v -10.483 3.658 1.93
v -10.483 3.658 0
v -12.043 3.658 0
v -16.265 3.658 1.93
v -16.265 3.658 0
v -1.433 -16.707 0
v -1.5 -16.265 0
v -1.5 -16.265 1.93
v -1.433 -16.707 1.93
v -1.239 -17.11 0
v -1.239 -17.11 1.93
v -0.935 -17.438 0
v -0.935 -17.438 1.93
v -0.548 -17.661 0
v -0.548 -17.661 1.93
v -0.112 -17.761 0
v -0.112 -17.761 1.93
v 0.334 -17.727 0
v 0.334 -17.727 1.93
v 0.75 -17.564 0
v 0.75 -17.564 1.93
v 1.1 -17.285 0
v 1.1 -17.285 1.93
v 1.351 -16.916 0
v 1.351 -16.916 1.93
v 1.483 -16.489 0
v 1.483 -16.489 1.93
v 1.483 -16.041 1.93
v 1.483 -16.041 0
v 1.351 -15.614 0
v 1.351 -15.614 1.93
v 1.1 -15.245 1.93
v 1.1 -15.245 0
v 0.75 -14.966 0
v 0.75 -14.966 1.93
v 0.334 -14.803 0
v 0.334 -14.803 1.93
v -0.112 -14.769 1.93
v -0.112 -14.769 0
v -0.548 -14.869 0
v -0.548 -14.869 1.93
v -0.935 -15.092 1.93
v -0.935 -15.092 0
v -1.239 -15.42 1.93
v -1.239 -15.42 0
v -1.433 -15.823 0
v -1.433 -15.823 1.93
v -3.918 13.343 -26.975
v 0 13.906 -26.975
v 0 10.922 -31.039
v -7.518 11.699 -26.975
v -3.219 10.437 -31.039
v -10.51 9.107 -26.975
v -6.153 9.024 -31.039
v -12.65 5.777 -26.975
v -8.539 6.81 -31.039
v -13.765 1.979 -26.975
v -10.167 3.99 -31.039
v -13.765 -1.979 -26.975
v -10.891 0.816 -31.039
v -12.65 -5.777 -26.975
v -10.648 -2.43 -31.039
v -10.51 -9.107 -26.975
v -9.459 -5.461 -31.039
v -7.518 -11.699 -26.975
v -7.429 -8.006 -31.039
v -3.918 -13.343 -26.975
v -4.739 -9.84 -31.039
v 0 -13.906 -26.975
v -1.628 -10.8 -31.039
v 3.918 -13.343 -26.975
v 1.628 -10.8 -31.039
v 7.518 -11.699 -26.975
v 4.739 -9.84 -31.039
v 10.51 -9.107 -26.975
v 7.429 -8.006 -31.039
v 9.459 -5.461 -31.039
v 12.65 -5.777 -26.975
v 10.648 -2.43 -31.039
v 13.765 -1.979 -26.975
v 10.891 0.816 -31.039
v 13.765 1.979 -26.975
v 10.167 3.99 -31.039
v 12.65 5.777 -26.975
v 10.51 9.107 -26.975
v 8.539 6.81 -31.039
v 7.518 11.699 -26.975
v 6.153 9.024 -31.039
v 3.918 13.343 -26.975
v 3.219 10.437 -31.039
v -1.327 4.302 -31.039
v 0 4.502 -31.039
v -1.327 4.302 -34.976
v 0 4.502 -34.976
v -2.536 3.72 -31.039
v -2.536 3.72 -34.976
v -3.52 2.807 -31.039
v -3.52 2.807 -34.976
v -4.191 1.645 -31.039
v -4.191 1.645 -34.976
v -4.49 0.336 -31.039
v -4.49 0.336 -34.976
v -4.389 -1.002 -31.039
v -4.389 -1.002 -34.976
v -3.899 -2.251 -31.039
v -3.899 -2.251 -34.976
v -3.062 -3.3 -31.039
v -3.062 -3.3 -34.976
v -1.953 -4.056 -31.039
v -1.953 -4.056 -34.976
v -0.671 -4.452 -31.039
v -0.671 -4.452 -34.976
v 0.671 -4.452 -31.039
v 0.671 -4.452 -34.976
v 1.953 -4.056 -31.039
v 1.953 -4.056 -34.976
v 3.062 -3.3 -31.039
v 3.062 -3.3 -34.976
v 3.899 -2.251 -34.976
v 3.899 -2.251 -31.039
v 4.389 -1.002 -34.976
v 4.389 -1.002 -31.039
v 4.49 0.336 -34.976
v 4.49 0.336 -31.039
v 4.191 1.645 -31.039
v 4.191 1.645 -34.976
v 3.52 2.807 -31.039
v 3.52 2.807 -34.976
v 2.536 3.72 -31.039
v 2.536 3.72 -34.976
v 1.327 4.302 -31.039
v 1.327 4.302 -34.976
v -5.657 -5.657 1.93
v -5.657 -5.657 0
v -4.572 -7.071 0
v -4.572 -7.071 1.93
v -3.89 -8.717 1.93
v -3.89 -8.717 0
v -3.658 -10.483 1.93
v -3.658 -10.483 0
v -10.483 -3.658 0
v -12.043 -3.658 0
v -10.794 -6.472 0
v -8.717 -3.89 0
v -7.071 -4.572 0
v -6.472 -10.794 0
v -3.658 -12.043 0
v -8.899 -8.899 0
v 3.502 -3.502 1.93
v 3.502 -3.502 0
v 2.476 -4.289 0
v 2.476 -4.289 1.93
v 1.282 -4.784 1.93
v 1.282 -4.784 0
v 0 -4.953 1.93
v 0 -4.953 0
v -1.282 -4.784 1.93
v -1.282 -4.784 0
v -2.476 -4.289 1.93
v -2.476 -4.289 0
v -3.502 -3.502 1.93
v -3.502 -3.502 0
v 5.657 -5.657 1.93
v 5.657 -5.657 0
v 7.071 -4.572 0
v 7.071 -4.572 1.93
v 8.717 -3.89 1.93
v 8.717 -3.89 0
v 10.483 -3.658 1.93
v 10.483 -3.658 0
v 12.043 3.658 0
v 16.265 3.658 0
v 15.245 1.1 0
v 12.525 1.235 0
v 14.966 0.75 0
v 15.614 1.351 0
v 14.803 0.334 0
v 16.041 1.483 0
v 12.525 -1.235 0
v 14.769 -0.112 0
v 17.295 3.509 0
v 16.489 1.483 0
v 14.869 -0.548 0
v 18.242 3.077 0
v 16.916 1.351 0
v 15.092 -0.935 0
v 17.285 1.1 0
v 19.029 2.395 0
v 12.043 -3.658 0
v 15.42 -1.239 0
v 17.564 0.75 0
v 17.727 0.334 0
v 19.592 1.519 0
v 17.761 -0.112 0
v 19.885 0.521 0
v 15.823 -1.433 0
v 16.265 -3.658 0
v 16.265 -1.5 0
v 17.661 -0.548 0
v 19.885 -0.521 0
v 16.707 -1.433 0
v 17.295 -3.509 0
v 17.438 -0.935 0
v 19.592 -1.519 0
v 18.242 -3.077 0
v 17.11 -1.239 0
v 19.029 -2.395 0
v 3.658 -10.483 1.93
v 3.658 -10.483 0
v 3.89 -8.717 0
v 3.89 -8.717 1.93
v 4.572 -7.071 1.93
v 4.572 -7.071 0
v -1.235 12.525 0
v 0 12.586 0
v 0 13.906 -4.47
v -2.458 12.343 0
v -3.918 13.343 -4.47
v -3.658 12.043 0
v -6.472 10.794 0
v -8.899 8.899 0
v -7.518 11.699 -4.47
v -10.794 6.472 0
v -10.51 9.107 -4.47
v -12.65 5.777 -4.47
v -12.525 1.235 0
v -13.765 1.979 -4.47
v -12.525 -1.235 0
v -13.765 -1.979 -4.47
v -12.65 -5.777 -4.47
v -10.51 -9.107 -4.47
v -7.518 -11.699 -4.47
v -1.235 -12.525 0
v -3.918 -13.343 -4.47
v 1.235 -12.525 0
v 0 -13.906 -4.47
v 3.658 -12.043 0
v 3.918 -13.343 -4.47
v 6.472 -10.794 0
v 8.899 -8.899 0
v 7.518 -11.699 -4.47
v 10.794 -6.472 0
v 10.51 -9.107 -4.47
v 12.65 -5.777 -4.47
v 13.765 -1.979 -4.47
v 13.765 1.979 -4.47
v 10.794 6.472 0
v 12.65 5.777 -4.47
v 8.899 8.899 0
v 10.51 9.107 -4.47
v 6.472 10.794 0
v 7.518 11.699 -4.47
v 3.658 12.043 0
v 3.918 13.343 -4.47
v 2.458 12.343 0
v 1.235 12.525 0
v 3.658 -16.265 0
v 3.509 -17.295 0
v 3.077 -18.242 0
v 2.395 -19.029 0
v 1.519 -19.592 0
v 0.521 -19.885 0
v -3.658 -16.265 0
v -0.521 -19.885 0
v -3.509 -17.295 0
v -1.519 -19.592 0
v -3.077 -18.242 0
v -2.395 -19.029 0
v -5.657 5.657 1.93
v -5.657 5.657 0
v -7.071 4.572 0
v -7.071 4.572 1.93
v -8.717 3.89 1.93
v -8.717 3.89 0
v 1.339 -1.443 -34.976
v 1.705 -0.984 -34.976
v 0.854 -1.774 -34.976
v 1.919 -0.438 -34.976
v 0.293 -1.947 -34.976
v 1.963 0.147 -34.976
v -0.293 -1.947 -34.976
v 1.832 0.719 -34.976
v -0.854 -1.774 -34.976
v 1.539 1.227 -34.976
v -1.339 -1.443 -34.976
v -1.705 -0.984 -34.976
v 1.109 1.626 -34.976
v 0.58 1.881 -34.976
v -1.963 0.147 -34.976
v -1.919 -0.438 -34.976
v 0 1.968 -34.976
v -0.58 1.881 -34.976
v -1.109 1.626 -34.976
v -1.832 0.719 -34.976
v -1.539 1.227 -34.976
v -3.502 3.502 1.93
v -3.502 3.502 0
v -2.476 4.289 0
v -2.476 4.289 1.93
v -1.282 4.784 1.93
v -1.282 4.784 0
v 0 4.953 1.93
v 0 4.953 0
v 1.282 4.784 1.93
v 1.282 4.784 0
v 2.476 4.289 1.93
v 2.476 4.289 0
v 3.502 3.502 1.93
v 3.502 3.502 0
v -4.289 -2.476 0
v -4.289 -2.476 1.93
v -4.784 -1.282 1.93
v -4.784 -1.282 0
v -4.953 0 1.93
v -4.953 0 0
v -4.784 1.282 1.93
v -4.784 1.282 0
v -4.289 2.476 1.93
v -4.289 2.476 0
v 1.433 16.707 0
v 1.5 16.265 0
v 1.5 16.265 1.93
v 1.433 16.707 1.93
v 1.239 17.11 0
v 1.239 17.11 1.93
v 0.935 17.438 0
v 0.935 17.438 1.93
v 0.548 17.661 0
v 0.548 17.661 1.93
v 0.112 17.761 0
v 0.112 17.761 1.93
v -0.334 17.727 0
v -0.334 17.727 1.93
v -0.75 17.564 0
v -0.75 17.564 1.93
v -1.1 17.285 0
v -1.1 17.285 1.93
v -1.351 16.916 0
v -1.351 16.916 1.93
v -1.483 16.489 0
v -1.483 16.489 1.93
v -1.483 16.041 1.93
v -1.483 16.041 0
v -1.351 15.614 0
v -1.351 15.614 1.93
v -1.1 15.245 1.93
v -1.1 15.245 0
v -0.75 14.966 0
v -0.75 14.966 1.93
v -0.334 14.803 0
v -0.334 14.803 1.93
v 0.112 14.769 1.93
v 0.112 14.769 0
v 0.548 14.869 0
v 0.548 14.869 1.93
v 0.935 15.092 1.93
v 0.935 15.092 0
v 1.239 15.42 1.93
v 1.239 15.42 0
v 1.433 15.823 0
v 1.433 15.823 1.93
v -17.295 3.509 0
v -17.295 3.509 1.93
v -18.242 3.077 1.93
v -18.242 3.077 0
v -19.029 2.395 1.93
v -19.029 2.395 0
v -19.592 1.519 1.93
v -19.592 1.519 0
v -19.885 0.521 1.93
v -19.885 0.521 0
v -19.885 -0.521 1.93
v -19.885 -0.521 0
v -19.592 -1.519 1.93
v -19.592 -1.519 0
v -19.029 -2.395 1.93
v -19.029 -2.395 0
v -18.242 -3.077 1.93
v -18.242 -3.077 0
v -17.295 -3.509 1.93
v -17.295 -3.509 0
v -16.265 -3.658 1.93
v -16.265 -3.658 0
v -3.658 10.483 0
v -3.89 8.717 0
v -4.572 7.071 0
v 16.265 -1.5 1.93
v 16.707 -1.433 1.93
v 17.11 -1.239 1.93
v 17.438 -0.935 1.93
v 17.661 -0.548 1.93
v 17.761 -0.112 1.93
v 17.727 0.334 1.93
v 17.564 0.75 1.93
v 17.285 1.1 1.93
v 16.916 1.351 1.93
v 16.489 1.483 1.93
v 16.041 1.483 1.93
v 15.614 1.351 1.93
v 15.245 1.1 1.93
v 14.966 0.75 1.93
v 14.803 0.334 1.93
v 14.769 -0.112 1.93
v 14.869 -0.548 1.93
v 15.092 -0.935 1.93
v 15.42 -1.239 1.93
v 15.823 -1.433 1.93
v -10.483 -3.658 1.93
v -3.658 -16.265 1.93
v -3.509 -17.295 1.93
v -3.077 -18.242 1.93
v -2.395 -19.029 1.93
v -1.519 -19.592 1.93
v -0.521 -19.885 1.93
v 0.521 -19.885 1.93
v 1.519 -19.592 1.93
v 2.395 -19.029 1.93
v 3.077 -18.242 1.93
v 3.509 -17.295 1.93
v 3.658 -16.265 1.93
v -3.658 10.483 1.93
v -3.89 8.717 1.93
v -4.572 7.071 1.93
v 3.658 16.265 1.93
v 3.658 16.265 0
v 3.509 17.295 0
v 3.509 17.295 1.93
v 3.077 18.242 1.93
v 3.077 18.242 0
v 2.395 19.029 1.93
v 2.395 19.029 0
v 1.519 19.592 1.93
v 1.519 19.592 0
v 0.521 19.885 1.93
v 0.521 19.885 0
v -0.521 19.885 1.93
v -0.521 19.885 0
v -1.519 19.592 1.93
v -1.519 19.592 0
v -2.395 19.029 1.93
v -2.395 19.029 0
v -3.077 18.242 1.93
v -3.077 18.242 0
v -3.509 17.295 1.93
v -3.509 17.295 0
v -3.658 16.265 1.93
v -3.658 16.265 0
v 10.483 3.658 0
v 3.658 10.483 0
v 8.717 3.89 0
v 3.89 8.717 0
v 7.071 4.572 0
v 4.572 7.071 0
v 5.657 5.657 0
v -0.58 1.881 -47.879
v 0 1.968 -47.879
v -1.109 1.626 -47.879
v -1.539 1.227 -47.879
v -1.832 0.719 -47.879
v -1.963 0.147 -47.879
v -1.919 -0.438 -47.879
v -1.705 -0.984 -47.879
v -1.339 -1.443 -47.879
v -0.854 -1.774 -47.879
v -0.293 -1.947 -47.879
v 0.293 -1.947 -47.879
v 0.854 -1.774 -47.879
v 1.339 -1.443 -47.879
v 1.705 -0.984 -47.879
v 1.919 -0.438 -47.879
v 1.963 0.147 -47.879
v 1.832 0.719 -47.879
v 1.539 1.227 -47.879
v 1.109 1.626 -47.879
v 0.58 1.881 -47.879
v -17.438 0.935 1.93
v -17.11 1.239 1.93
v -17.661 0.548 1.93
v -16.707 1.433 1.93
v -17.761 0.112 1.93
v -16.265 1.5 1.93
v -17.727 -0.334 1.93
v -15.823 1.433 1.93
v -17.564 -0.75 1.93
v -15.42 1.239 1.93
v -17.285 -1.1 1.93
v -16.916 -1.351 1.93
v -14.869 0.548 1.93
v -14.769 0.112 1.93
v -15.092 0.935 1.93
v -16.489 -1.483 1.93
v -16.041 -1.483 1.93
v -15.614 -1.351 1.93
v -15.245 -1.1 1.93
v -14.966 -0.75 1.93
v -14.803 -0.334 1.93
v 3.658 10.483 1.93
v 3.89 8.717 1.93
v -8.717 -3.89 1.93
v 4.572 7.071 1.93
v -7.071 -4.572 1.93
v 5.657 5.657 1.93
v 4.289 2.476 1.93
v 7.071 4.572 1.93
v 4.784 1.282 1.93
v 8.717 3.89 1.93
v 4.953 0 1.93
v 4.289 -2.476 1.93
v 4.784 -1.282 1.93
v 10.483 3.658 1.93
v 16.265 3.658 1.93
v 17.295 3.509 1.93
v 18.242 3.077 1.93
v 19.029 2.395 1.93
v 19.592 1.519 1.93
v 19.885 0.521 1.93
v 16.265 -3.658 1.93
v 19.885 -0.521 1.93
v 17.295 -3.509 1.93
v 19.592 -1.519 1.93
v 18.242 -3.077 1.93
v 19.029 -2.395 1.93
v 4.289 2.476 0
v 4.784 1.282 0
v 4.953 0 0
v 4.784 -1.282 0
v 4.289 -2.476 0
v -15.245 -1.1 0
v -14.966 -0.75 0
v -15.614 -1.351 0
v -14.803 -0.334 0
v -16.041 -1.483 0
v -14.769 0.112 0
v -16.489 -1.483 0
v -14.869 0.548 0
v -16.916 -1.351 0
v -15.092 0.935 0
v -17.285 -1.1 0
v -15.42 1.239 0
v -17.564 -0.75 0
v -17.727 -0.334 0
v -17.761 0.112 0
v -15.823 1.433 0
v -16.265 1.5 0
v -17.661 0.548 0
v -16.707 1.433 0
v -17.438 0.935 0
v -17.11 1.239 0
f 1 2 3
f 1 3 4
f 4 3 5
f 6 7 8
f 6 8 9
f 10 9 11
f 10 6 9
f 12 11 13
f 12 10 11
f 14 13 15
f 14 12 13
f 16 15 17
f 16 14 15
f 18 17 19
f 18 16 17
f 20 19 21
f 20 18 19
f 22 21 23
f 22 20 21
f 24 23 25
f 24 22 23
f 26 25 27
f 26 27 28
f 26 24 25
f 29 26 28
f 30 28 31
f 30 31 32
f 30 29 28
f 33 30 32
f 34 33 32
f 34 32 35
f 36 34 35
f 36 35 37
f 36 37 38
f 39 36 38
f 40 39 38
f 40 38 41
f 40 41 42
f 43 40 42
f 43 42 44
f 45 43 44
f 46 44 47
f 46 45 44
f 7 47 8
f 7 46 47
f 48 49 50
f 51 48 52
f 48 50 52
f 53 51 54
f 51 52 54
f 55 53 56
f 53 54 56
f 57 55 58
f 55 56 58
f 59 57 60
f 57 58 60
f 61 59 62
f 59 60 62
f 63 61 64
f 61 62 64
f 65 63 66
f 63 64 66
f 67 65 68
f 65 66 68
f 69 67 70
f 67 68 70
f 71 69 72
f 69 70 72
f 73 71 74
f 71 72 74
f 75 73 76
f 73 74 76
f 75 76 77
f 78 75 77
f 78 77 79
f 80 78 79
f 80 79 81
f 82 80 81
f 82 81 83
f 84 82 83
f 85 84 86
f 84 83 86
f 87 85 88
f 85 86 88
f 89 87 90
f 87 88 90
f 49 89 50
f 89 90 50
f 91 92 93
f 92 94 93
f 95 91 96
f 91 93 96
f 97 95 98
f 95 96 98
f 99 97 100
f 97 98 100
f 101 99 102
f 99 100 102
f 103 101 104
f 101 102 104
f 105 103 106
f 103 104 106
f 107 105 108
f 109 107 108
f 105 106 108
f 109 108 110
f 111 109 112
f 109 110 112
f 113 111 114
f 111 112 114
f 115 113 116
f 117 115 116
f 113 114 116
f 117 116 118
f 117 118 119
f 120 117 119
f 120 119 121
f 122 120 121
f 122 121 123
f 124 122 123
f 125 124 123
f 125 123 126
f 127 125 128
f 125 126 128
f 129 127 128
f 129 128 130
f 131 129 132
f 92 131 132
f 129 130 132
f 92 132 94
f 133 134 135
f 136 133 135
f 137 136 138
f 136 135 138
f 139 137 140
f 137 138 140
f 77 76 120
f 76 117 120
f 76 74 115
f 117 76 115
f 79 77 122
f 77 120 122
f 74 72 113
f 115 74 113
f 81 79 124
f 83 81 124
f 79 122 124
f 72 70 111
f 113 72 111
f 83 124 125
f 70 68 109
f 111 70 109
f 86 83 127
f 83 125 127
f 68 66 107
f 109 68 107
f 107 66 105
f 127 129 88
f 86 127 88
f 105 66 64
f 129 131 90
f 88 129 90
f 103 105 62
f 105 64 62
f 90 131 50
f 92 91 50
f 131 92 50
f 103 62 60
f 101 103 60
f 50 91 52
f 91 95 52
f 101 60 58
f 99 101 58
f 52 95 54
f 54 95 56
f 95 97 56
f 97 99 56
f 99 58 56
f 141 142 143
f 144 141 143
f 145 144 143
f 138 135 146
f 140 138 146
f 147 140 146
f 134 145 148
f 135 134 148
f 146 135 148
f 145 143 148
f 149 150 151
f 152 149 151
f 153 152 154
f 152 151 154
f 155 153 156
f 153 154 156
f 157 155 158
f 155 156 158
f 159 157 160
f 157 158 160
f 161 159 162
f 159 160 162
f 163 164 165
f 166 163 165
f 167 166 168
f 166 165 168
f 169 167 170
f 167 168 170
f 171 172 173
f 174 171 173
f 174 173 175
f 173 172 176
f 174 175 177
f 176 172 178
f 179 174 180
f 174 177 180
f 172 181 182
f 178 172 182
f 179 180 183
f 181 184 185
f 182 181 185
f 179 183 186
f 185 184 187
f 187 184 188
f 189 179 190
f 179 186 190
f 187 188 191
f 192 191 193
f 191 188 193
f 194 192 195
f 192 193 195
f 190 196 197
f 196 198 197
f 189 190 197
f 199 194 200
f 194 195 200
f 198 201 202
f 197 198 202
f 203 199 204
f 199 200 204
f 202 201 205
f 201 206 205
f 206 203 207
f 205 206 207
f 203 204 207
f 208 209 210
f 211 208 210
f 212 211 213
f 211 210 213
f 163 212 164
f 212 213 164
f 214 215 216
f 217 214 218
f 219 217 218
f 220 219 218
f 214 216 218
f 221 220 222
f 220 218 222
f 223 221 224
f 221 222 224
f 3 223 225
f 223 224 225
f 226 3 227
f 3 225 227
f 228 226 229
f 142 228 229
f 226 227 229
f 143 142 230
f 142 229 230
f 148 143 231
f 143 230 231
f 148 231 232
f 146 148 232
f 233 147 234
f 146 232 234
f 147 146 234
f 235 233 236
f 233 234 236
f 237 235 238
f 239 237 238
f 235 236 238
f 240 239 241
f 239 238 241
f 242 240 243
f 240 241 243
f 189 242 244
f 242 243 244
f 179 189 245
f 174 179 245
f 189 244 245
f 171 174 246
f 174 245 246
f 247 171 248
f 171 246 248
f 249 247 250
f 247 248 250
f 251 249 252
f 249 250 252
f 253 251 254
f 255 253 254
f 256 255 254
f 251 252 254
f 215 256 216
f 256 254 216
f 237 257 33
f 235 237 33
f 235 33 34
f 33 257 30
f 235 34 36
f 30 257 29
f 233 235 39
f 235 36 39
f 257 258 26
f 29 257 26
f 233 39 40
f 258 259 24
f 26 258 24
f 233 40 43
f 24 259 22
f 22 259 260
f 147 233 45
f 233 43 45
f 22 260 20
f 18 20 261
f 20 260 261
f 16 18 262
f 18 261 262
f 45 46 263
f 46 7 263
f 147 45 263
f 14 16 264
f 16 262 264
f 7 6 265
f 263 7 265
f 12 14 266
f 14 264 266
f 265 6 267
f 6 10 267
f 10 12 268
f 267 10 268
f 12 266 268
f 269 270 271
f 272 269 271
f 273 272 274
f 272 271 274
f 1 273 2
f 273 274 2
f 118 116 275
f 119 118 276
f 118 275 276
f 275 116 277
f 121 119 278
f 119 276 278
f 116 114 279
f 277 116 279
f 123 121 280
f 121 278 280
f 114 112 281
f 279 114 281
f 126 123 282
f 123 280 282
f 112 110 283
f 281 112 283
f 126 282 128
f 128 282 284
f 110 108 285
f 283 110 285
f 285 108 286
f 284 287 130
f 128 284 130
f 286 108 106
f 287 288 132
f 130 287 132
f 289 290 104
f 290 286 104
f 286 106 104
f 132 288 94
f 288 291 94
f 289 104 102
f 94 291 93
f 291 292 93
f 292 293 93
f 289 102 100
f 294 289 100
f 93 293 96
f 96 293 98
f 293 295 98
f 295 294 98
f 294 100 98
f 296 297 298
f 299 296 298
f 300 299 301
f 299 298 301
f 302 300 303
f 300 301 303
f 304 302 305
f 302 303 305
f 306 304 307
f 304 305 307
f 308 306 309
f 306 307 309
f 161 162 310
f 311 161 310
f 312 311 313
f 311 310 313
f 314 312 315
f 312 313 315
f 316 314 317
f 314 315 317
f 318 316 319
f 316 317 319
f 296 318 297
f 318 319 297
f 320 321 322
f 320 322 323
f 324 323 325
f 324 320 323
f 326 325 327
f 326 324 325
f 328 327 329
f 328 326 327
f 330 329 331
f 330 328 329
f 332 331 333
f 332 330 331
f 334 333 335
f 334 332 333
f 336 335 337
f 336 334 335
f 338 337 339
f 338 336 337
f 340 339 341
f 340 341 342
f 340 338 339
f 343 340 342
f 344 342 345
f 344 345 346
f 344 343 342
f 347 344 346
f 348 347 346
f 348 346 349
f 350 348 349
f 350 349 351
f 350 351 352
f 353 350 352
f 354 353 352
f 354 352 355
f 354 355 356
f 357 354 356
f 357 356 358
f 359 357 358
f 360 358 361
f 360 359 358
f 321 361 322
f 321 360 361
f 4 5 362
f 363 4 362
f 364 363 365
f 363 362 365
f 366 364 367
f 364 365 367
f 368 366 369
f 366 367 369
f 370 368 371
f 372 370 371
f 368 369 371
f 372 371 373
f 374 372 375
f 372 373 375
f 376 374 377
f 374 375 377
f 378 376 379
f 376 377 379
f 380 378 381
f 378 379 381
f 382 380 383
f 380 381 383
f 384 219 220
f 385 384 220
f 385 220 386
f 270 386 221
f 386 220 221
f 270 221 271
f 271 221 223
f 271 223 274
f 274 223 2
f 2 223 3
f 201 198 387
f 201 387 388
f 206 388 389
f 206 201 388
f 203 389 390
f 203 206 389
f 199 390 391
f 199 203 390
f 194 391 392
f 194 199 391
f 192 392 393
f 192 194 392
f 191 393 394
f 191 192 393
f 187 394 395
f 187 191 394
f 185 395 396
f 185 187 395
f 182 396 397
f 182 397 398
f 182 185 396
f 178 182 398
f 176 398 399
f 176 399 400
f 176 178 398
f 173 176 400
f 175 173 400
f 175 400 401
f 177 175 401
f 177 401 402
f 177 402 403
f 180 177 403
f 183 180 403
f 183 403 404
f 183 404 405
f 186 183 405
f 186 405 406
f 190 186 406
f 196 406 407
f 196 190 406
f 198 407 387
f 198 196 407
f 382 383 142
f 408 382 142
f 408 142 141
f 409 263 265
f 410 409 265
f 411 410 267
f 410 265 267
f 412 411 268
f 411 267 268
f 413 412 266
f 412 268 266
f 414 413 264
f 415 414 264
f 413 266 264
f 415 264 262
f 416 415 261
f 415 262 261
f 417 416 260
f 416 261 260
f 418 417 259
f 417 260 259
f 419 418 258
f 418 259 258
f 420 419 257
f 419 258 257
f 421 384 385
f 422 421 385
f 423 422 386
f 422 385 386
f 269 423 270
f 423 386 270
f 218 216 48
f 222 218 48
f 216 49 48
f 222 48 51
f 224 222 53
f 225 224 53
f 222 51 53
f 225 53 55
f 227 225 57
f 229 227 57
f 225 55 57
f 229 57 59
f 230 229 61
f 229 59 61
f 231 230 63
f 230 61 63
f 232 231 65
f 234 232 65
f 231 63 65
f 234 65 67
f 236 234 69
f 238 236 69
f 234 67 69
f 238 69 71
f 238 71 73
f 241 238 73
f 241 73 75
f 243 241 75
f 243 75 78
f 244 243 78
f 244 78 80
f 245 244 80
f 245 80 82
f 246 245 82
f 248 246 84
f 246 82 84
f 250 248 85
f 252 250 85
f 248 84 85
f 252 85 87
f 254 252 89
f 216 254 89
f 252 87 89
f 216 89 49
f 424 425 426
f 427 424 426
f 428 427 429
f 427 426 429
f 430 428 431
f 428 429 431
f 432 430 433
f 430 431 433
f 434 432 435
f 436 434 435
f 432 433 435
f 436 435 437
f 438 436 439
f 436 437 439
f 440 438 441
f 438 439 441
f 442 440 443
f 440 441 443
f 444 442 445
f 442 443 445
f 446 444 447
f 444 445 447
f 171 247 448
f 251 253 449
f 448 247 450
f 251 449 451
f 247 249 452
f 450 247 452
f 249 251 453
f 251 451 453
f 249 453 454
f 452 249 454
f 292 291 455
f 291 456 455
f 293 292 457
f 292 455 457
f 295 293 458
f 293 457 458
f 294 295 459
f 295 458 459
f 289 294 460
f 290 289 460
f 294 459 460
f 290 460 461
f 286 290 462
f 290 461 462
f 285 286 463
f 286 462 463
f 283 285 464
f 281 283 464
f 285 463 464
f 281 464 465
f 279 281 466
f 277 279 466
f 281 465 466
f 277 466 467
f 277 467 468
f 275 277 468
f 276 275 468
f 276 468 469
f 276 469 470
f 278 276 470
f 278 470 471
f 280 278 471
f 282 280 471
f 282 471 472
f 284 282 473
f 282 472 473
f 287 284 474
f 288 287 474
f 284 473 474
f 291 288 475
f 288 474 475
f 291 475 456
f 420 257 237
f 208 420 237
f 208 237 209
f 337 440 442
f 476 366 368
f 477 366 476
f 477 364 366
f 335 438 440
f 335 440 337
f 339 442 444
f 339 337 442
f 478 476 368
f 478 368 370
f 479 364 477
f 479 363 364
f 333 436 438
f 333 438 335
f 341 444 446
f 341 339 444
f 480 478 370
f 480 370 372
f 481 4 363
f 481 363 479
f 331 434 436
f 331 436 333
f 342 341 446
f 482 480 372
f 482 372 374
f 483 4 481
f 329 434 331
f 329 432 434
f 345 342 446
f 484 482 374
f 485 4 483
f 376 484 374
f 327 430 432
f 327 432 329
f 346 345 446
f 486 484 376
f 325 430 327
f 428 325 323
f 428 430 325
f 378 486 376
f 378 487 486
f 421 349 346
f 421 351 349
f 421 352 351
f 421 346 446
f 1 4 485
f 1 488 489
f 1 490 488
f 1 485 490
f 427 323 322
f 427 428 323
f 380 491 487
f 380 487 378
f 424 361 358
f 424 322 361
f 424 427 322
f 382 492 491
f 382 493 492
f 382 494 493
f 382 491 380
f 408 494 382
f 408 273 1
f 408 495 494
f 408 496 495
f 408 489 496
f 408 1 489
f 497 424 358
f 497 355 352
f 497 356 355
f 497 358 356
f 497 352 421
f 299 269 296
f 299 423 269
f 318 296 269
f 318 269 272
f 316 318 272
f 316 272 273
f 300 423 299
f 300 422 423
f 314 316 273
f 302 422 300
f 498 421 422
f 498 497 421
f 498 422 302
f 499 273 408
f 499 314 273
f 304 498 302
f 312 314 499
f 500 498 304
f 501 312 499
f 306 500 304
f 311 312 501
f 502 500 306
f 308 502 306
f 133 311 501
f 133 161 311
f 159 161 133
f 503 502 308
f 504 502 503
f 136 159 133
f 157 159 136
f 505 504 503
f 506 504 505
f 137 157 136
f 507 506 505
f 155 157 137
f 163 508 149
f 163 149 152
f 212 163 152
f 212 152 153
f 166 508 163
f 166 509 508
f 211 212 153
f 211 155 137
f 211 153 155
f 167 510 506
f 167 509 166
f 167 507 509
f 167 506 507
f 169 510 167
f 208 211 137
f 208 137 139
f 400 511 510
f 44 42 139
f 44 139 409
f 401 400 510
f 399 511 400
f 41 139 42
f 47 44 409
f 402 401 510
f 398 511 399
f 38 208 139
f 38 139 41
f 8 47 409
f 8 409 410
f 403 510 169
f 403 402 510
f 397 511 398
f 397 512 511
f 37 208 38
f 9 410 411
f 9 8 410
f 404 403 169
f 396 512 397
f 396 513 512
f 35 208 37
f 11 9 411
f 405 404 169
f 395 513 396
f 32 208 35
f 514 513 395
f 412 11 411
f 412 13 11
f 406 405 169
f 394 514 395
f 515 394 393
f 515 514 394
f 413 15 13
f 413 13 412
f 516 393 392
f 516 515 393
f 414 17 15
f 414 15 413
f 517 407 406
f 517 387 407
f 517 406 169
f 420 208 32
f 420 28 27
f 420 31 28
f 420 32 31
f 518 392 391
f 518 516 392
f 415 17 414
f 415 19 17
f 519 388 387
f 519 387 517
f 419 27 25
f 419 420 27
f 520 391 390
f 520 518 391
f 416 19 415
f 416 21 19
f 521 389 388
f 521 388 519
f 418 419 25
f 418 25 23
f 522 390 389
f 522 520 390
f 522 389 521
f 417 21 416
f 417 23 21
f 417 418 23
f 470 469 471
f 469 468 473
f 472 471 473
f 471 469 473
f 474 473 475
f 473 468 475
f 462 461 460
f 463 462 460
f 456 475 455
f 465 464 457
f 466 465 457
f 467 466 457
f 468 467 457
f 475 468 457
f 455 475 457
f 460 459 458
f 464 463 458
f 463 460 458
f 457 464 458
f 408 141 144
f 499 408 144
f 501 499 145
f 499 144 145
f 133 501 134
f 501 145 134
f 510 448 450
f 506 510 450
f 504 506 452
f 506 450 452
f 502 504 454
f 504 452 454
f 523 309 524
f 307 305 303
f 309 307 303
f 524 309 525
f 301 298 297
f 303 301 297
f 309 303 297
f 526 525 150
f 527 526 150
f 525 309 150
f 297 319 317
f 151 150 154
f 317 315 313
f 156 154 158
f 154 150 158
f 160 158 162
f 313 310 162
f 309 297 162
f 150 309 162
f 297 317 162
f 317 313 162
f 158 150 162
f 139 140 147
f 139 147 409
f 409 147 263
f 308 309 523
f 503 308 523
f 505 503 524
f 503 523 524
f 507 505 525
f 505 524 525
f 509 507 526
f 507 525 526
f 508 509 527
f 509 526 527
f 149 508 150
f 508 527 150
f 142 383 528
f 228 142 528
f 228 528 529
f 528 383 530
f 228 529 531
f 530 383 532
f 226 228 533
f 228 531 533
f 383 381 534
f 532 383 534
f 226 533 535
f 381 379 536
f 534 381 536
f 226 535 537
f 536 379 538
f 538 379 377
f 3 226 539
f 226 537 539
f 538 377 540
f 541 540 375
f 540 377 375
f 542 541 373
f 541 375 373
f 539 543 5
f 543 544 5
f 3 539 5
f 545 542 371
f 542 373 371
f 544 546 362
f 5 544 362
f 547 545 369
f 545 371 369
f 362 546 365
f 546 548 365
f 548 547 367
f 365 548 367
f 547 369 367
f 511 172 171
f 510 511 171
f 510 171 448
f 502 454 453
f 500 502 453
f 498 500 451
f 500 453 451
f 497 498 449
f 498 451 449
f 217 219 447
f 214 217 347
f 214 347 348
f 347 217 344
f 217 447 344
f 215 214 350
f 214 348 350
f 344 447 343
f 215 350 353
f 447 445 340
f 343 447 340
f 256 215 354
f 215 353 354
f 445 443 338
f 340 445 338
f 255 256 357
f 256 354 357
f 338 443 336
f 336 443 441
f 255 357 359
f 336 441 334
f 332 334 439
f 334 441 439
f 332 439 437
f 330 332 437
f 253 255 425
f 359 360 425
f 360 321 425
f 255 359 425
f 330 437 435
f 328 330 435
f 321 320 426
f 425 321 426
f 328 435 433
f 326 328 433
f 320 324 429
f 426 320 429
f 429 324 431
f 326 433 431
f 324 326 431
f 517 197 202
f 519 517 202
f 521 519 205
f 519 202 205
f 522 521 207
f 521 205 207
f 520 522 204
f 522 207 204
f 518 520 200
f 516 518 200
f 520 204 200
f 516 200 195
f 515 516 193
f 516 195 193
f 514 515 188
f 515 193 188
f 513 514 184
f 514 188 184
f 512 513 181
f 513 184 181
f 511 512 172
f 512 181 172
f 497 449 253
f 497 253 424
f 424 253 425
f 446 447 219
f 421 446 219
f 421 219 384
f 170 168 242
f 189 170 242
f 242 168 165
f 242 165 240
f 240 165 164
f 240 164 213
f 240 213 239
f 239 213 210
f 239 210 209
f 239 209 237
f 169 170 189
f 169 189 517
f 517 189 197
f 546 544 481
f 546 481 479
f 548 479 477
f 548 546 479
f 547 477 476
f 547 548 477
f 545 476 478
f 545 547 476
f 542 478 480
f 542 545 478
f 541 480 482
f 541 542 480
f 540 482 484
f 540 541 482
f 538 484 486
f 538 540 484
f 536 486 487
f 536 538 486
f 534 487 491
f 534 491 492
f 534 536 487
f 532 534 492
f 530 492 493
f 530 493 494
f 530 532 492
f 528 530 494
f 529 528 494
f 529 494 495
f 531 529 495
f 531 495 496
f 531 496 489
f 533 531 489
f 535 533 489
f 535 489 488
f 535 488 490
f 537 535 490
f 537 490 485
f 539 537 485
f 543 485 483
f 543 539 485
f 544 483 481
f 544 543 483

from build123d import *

# Parameters (mm, degrees)
SKETCH2_R           = 1.5
BOSS_EXTRUDE1_DEPTH = 1.9304
CIRPATTERN1_COUNT   = 4


with BuildPart() as part:
    # Sketch1 → Revolve1 (revolve)
    with BuildSketch(Plane(origin=(0, 0, 0), x_dir=(0, 0, -1), z_dir=(1, 0, 0))):
        Polygon((0, 0), (0, 12.5857), (4.4704, 13.9065), (26.9748, 13.9065), (31.0388, 10.922), (31.0388, 4.50215), (34.9758, 4.50215), (34.9758, 1.9685), (47.879, 1.9685), (47.879, 0), align=None)
    revolve(axis=Axis((0, 0, 0), (0, 0, 1)))

    # Sketch2 → Boss-Extrude1 (add)
    with BuildSketch(Plane.XY):
        with BuildLine():
            Line((-3.6576, 12.04250002), (-3.6576, 10.483480973))
            Line((-3.6576, 10.483480973), (-3.6576, 3.6576))
            Line((-3.6576, 3.6576), (-3.502299887, 3.502299887))
            ThreePointArc((-3.502299887, 3.502299887), (0, 4.953), (3.502299887, 3.502299887))
            Line((3.502299887, 3.502299887), (3.6576, 3.6576))
            Line((3.6576, 3.6576), (3.6576, 10.483480973))
            Line((3.6576, 10.483480973), (3.6576, 12.04250002))
            ThreePointArc((3.6576, 12.04250002), (0, 12.5857), (-3.6576, 12.04250002))
        make_face()
        with BuildLine():
            Line((-3.6576, 3.6576), (-3.6576, 10.483480973))
            ThreePointArc((-3.6576, 10.483480973), (-4.177189251, 7.871329413), (-5.656854249, 5.656854249))
            Line((-5.656854249, 5.656854249), (-3.6576, 3.6576))
        make_face()
        with BuildLine():
            ThreePointArc((5.656854249, 5.656854249), (4.177189251, 7.871329413), (3.6576, 10.483480973))
            Line((3.6576, 10.483480973), (3.6576, 3.6576))
            Line((3.6576, 3.6576), (5.656854249, 5.656854249))
        make_face()
        with BuildLine():
            Line((-3.6576, 16.265), (-3.6576, 12.04250002))
            ThreePointArc((-3.6576, 12.04250002), (0, 12.5857), (3.6576, 12.04250002))
            Line((3.6576, 12.04250002), (3.6576, 16.265))
            ThreePointArc((3.6576, 16.265), (0, 19.9226), (-3.6576, 16.265))
        make_face()
        with Locations((0, 16.265)):
            Circle(SKETCH2_R, mode=Mode.SUBTRACT)
    boss_extrude1 = extrude(amount=BOSS_EXTRUDE1_DEPTH)

    # CirPattern1: Boss-Extrude1 ×4 about axis
    cirpattern1_axis = Axis((0, 0, 0), (0, 0, 1))
    for i in range(1, CIRPATTERN1_COUNT):
        add(boss_extrude1.rotate(cirpattern1_axis, i * 360 / CIRPATTERN1_COUNT))


solid = part.part
